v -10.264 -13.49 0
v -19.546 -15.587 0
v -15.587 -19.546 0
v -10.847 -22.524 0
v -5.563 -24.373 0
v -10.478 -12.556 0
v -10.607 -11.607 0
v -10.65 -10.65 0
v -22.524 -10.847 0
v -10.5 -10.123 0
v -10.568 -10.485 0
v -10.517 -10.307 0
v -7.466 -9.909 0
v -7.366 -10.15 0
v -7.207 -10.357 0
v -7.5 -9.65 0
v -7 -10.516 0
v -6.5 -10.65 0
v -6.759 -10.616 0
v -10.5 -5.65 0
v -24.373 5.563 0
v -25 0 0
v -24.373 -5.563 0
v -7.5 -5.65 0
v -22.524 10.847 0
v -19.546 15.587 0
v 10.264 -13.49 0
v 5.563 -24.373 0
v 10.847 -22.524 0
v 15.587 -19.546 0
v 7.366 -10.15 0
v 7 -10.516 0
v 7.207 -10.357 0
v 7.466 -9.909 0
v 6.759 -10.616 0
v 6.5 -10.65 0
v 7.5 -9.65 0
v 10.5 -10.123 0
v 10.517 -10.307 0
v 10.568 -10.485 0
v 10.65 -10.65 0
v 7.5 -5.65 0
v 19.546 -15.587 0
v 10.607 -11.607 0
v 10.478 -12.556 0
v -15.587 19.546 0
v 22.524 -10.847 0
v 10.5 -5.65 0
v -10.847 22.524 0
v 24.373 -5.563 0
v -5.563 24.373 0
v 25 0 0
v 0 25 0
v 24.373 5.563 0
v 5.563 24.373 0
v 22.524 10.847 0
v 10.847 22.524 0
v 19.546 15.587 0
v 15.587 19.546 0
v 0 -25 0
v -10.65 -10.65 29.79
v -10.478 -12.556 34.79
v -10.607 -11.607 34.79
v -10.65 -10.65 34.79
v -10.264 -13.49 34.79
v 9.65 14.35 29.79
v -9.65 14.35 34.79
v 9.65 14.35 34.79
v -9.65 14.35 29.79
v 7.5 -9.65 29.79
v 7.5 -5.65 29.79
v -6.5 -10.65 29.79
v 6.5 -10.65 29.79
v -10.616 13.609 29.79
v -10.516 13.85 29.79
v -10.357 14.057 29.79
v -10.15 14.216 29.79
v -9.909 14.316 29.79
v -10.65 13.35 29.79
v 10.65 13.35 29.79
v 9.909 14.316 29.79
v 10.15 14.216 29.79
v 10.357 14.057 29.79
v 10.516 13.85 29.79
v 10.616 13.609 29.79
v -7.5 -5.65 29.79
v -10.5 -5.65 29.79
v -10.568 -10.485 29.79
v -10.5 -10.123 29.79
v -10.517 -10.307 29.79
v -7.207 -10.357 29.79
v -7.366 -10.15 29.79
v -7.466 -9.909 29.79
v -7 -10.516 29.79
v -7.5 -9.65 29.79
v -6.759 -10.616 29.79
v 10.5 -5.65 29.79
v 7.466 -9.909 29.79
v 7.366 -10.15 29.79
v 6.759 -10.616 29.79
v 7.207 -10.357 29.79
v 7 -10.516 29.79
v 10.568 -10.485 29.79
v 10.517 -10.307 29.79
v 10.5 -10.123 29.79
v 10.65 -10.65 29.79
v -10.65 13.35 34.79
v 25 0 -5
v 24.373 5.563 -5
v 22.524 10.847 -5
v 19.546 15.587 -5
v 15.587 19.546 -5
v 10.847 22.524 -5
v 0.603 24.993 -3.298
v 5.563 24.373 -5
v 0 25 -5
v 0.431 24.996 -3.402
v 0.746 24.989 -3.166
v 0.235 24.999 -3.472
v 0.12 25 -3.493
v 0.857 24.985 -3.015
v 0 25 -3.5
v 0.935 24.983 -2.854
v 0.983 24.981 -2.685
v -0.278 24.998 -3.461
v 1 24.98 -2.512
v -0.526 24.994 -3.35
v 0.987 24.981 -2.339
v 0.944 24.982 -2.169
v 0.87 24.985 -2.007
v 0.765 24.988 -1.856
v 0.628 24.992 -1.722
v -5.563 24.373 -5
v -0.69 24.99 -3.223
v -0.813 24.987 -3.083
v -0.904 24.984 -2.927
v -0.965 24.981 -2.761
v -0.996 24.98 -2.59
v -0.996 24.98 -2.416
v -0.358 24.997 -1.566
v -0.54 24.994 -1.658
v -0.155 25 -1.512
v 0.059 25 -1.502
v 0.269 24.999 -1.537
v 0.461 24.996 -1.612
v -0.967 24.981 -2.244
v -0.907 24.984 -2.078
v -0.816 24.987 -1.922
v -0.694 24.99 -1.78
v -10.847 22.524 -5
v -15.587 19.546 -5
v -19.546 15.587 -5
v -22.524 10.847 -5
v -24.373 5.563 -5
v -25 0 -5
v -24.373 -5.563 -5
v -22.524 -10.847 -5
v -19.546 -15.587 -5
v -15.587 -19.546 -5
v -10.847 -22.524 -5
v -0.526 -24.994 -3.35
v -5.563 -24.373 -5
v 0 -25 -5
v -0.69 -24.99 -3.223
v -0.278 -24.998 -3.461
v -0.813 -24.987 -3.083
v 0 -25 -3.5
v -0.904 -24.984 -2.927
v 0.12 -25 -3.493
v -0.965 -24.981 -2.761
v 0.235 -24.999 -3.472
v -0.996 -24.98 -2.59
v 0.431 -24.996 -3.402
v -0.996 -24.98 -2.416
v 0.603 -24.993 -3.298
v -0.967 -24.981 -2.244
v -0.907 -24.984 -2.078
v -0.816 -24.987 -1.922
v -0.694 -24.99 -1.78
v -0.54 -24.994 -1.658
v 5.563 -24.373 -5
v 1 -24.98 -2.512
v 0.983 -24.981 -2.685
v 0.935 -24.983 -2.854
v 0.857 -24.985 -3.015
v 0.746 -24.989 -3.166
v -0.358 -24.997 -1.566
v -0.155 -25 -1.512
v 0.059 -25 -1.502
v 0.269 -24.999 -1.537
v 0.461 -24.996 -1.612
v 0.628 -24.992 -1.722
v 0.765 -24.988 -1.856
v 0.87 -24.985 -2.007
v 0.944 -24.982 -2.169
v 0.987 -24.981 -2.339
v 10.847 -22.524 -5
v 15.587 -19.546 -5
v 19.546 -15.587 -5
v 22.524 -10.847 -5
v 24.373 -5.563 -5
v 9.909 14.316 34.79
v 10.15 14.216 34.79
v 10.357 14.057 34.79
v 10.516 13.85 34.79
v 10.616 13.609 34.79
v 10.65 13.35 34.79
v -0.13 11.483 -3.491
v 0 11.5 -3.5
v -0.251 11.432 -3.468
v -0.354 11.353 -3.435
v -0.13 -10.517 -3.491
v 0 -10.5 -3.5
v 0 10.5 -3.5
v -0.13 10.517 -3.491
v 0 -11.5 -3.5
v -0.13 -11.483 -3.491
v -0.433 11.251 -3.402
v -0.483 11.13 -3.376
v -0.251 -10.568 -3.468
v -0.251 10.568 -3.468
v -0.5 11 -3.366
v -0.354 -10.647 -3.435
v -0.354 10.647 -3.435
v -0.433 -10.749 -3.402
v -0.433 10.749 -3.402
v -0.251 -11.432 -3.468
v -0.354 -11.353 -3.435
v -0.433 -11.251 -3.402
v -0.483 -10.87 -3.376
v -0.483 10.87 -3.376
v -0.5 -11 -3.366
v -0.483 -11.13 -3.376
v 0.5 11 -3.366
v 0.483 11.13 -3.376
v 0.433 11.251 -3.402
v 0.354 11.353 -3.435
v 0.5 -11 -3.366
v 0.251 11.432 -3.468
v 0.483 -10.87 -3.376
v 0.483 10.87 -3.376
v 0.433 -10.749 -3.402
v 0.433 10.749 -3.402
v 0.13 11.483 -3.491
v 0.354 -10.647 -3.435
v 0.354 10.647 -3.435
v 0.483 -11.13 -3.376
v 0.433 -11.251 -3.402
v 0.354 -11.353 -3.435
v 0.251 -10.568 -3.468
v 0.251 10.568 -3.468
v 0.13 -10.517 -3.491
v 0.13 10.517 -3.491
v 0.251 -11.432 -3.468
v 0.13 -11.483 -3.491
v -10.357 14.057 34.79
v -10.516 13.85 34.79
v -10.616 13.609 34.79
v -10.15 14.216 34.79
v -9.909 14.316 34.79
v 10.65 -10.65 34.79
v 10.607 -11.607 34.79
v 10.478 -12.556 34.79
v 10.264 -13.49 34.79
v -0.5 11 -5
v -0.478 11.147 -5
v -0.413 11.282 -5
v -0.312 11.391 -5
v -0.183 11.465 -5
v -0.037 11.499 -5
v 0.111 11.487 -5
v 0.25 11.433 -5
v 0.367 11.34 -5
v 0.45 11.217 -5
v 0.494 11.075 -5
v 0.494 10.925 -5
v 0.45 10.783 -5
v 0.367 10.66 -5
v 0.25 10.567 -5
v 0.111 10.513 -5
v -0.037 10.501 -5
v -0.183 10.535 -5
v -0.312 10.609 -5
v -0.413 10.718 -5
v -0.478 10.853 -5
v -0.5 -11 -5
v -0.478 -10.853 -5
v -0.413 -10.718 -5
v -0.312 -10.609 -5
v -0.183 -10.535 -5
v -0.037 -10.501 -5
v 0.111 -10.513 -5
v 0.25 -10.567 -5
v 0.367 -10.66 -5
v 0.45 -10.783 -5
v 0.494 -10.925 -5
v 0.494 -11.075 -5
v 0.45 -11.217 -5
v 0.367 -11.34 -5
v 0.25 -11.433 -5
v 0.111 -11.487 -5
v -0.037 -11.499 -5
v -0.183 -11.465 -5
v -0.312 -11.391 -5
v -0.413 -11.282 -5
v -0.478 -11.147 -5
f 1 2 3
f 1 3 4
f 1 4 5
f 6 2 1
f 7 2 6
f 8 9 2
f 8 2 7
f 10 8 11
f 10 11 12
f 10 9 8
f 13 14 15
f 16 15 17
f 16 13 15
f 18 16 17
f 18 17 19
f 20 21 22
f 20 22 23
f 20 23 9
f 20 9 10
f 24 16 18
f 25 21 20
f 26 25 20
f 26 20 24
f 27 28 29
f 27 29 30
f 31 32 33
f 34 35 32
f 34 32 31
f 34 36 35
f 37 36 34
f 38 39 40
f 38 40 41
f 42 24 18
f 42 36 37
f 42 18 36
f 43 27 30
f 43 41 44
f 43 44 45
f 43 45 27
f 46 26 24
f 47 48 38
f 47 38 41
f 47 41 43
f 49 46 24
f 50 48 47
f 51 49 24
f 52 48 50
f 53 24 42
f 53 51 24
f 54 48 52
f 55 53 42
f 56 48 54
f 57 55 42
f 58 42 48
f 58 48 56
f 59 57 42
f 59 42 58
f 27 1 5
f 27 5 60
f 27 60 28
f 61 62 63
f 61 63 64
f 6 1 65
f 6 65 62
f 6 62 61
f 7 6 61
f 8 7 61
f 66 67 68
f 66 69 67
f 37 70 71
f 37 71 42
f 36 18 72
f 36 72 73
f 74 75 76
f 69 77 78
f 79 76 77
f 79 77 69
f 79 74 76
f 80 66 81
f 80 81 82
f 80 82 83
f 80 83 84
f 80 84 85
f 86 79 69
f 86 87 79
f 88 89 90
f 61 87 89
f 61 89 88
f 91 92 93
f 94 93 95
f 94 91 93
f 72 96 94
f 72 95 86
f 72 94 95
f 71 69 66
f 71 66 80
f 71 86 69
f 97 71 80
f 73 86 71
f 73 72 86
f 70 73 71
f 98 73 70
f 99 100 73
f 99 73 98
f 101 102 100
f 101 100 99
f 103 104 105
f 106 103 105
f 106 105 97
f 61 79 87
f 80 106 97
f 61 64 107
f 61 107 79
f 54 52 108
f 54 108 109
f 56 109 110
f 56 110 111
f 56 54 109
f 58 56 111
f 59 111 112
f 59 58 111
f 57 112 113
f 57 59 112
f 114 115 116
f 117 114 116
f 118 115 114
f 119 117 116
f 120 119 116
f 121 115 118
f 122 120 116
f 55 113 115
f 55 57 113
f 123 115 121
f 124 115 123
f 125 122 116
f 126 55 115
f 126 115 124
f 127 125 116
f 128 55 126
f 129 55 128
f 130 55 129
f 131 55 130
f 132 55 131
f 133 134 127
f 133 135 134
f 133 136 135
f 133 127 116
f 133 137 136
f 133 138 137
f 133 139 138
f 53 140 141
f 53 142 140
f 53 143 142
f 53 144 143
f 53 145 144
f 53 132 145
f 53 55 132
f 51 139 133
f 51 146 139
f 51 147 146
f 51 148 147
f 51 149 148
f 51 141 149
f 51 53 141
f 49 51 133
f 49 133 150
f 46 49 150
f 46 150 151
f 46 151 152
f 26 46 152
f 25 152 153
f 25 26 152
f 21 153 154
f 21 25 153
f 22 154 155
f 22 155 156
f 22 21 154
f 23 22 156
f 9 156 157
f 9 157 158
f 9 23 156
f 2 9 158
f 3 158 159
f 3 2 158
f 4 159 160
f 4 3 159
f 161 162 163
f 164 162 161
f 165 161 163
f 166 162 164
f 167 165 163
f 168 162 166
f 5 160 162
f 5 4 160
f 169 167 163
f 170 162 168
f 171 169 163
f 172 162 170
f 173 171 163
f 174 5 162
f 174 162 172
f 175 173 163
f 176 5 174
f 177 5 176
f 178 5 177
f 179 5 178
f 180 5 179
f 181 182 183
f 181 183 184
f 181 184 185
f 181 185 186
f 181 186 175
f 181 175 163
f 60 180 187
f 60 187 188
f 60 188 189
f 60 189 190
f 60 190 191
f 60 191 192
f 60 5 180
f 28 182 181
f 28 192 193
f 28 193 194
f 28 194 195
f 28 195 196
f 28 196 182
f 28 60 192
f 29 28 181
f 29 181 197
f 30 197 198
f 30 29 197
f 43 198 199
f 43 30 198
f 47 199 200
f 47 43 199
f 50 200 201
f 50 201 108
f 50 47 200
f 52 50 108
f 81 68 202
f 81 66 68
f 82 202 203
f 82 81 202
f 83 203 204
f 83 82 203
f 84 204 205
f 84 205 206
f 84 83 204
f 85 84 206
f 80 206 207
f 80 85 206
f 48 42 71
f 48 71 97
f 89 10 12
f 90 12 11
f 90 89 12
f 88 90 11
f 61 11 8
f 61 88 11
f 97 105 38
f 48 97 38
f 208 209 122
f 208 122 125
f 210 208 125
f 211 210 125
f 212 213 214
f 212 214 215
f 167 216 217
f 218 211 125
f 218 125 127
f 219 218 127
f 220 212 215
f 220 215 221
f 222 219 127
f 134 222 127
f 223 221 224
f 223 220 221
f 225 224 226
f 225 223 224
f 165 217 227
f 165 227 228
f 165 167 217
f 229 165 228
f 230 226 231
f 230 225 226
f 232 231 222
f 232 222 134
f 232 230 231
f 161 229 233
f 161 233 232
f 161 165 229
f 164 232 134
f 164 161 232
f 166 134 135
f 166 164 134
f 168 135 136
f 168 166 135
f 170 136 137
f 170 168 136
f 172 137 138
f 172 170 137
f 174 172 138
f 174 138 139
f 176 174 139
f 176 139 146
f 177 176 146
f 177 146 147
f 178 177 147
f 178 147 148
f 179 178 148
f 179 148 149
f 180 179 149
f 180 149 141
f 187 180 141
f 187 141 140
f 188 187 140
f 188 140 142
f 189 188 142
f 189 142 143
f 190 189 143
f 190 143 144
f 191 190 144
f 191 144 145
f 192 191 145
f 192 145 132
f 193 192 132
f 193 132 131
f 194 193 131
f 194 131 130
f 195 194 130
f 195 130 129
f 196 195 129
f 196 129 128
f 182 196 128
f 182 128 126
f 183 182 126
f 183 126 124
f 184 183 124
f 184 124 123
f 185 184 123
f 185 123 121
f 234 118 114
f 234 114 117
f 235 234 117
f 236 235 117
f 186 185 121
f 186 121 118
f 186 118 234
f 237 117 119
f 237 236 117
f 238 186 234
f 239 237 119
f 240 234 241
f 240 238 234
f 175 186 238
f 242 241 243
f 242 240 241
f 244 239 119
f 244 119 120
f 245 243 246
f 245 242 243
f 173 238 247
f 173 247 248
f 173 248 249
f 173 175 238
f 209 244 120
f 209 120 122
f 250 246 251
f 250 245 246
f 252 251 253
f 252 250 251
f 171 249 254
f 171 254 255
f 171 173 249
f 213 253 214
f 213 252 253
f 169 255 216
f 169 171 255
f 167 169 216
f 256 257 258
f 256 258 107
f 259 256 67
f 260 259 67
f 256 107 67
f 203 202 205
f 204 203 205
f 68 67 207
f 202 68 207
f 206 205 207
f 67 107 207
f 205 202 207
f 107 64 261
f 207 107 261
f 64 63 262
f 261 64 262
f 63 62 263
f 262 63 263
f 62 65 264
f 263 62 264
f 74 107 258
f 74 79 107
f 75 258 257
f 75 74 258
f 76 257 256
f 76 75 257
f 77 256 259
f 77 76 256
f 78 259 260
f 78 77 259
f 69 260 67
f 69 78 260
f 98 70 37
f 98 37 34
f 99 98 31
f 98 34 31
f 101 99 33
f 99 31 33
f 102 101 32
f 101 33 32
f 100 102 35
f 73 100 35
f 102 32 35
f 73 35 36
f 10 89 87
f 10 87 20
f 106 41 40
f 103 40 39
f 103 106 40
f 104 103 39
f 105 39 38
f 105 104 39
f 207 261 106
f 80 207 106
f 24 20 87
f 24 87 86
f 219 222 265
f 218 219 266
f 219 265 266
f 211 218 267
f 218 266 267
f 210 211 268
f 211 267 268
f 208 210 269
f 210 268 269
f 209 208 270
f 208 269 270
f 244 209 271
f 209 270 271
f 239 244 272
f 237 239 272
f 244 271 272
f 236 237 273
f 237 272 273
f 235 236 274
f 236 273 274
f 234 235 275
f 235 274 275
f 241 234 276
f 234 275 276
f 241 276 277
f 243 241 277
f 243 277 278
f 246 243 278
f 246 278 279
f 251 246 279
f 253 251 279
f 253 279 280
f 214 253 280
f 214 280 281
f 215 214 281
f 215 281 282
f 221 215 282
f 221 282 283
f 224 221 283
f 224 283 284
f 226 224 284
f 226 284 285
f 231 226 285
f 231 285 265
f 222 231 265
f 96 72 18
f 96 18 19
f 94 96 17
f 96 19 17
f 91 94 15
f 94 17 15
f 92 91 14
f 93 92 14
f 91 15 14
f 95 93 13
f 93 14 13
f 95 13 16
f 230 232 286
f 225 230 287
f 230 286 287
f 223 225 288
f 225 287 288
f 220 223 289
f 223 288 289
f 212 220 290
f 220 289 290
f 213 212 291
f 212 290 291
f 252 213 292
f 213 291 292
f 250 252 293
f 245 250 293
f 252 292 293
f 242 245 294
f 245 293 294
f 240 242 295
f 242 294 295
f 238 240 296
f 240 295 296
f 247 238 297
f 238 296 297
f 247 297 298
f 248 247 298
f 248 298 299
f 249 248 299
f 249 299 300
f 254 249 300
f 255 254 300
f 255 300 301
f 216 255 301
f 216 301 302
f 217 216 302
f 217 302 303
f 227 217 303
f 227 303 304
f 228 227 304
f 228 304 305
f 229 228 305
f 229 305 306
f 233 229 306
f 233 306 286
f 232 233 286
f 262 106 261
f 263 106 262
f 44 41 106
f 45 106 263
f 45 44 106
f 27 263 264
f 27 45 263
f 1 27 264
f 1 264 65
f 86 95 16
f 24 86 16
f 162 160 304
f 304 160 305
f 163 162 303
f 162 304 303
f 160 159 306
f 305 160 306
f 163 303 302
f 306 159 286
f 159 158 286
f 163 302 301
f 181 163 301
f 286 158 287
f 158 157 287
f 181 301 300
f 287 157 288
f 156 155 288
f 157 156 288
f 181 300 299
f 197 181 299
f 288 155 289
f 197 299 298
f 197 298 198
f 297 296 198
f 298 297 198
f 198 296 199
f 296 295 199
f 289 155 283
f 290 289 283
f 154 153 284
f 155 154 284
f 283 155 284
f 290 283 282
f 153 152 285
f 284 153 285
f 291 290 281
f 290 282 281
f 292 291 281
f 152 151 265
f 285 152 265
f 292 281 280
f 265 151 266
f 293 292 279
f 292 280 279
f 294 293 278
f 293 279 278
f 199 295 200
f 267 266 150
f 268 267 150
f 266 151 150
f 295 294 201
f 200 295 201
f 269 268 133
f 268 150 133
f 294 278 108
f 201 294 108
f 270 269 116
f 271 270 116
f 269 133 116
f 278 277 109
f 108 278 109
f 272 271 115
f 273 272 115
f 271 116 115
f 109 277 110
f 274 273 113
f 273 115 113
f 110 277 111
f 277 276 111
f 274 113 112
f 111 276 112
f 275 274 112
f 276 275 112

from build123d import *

# Parameters (mm, degrees)
SKETCH1_R               = 25
BOSS_EXTRUDE1_DEPTH     = 5
BOSS_EXTRUDE2_DEPTH     = 34.79
SKETCH3_W               = 21.3
SKETCH3_H               = 5
BOSS_EXTRUDE3_DEPTH     = 25
SKETCH4_W               = 3
SKETCH4_H               = 29.79
BOSS_EXTRUDE5_DEPTH     = 5
CUT_EXTRUDE1_DEPTH      = 38
CUT_EXTRUDE1_DEPTH_BACK = 50.601855812
SKETCH5_R               = 1
FILLET1_R               = 1
FILLET2_R               = 1
FILLET3_R               = 1
CUT_EXTRUDE2_REACH      = 55.228
CUT_EXTRUDE2_END_RADIUS = 1
SKETCH6_R               = 0.5


with BuildPart() as part:
    # Sketch1 → Boss-Extrude1 (new body)
    with BuildSketch(Plane.XY):
        Circle(SKETCH1_R)
    extrude(amount=-BOSS_EXTRUDE1_DEPTH)

    # Sketch2 → Boss-Extrude2 (add)
    with BuildSketch(Plane.XY):
        with BuildLine():
            Line((-10.65, -10.65), (10.65, -10.65))
            ThreePointArc((10.65, -10.65), (10.553147336, -12.083032205), (10.264350929, -13.49))
            Line((10.264350929, -13.49), (-10.264350929, -13.49))
            ThreePointArc((-10.264350929, -13.49), (-10.553147336, -12.083032205), (-10.65, -10.65))
        make_face()
    extrude(amount=BOSS_EXTRUDE2_DEPTH)

    # Sketch3 → Boss-Extrude3 (add)
    with BuildSketch(Plane(origin=(0, -10.65, 0), x_dir=(1, 0, 0), z_dir=(0, 1, 0))):
        with Locations((0, -32.29)):
            Rectangle(SKETCH3_W, SKETCH3_H)
    extrude(amount=BOSS_EXTRUDE3_DEPTH)

    # Sketch4 → Boss-Extrude5 (add)
    with BuildSketch(Plane(origin=(0, -10.65, 0), x_dir=(1, 0, 0), z_dir=(0, 1, 0))):
        with Locations((9, -14.895)):
            Rectangle(SKETCH4_W, SKETCH4_H)
        with Locations((-9, -14.895)):
            Rectangle(SKETCH4_W, SKETCH4_H)
    extrude(amount=BOSS_EXTRUDE5_DEPTH)

    # Sketch5 → Cut-Extrude1 (cut, two sides: drawn at the far end of the back side and taken through both)
    with BuildSketch(Plane(origin=(0, 0, 0), x_dir=(1, 0, 0), z_dir=(0, 1, 0)).offset(-CUT_EXTRUDE1_DEPTH_BACK)):
        with Locations(Location((0, 2.5, 0), (0, 0, 90))):
            Circle(SKETCH5_R)
    extrude(amount=CUT_EXTRUDE1_DEPTH + CUT_EXTRUDE1_DEPTH_BACK, mode=Mode.SUBTRACT)

    # Fillet1
    fillet1_edges = [part.edges().sort_by_distance(p)[0] for p in [
        (10.65, 14.35, 32.29),
        (-10.65, 14.35, 32.29),
    ]]
    fillet(fillet1_edges, radius=FILLET1_R)

    # Fillet2
    fillet2_edges = [part.edges().sort_by_distance(p)[0] for p in [
        (7.5, -10.65, 14.895),
        (-7.5, -10.65, 14.895),
    ]]
    fillet(fillet2_edges, radius=FILLET2_R)

    # Fillet3
    # the kernel refuses this fillet: 1 mm, written as the material it adds along each edge
    with BuildSketch(Plane(origin=(10.5, -10.65, 31.106956719), x_dir=(0, 1, 0), z_dir=(0, 0, -1))) as fillet3_piece_1:
        with BuildLine():
            CenterArc((0.526782688, 1), FILLET3_R, 238.211669382, 31.788330618)
            Line((0, 0.15), (-0.010535654, 0.133))
            ThreePointArc((-0.010535654, 0.133), (-0.02, 0.075), (-0.02, 0))
            Line((-0.02, 0), (0, -0.02))
            Line((0, -0.02), (0.526782688, -0.02))
            Line((0.526782688, -0.02), (0.526782688, 0))
        make_face()
    extrude(amount=32.423913438)
    with BuildSketch(Plane(origin=(-10.5, -10.65, 31.106956719), x_dir=(0, 1, 0), z_dir=(0, 0, -1))) as fillet3_piece_2:
        with BuildLine():
            CenterArc((0.526782688, -1), FILLET3_R, 90, 31.788330618)
            Line((0, -0.15), (-0.010535654, -0.133))
            ThreePointArc((-0.010535654, -0.133), (-0.02, -0.075), (-0.02, 0))
            Line((-0.02, 0), (0, 0.02))
            Line((0, 0.02), (0.526782688, 0.02))
            Line((0.526782688, 0.02), (0.526782688, 0))
        make_face()
    extrude(amount=32.423913438)

    # Cut-Extrude2: up to this cylinder (the profile starts outside it)
    cut_extrude2_end = Plane(origin=(0, 0, -2.5), z_dir=(0, -1, 0)) * Cylinder(CUT_EXTRUDE2_END_RADIUS, 135.456, mode=Mode.PRIVATE)
    # Sketch6 → Cut-Extrude2 (cut, up to the surface)
    with BuildSketch(Plane(origin=(0, 0, -5), x_dir=(-1, 0, 0), z_dir=(0, 0, -1)), mode=Mode.PRIVATE) as cut_extrude2_sk1:
        with Locations((0, 11)):
            Circle(SKETCH6_R)
    cut_extrude2_tool1 = extrude(cut_extrude2_sk1.sketch, amount=-CUT_EXTRUDE2_REACH, mode=Mode.PRIVATE) - cut_extrude2_end
    add(cut_extrude2_tool1.solids().sort_by_distance((0, 11, -5))[0], mode=Mode.SUBTRACT)
    # Sketch6 → Cut-Extrude2 (cut, up to the surface)
    with BuildSketch(Plane(origin=(0, 0, -5), x_dir=(-1, 0, 0), z_dir=(0, 0, -1)), mode=Mode.PRIVATE) as cut_extrude2_sk2:
        with Locations((0, -11)):
            Circle(SKETCH6_R)
    cut_extrude2_tool2 = extrude(cut_extrude2_sk2.sketch, amount=-CUT_EXTRUDE2_REACH, mode=Mode.PRIVATE) - cut_extrude2_end
    add(cut_extrude2_tool2.solids().sort_by_distance((0, -11, -5))[0], mode=Mode.SUBTRACT)


solid = part.part
